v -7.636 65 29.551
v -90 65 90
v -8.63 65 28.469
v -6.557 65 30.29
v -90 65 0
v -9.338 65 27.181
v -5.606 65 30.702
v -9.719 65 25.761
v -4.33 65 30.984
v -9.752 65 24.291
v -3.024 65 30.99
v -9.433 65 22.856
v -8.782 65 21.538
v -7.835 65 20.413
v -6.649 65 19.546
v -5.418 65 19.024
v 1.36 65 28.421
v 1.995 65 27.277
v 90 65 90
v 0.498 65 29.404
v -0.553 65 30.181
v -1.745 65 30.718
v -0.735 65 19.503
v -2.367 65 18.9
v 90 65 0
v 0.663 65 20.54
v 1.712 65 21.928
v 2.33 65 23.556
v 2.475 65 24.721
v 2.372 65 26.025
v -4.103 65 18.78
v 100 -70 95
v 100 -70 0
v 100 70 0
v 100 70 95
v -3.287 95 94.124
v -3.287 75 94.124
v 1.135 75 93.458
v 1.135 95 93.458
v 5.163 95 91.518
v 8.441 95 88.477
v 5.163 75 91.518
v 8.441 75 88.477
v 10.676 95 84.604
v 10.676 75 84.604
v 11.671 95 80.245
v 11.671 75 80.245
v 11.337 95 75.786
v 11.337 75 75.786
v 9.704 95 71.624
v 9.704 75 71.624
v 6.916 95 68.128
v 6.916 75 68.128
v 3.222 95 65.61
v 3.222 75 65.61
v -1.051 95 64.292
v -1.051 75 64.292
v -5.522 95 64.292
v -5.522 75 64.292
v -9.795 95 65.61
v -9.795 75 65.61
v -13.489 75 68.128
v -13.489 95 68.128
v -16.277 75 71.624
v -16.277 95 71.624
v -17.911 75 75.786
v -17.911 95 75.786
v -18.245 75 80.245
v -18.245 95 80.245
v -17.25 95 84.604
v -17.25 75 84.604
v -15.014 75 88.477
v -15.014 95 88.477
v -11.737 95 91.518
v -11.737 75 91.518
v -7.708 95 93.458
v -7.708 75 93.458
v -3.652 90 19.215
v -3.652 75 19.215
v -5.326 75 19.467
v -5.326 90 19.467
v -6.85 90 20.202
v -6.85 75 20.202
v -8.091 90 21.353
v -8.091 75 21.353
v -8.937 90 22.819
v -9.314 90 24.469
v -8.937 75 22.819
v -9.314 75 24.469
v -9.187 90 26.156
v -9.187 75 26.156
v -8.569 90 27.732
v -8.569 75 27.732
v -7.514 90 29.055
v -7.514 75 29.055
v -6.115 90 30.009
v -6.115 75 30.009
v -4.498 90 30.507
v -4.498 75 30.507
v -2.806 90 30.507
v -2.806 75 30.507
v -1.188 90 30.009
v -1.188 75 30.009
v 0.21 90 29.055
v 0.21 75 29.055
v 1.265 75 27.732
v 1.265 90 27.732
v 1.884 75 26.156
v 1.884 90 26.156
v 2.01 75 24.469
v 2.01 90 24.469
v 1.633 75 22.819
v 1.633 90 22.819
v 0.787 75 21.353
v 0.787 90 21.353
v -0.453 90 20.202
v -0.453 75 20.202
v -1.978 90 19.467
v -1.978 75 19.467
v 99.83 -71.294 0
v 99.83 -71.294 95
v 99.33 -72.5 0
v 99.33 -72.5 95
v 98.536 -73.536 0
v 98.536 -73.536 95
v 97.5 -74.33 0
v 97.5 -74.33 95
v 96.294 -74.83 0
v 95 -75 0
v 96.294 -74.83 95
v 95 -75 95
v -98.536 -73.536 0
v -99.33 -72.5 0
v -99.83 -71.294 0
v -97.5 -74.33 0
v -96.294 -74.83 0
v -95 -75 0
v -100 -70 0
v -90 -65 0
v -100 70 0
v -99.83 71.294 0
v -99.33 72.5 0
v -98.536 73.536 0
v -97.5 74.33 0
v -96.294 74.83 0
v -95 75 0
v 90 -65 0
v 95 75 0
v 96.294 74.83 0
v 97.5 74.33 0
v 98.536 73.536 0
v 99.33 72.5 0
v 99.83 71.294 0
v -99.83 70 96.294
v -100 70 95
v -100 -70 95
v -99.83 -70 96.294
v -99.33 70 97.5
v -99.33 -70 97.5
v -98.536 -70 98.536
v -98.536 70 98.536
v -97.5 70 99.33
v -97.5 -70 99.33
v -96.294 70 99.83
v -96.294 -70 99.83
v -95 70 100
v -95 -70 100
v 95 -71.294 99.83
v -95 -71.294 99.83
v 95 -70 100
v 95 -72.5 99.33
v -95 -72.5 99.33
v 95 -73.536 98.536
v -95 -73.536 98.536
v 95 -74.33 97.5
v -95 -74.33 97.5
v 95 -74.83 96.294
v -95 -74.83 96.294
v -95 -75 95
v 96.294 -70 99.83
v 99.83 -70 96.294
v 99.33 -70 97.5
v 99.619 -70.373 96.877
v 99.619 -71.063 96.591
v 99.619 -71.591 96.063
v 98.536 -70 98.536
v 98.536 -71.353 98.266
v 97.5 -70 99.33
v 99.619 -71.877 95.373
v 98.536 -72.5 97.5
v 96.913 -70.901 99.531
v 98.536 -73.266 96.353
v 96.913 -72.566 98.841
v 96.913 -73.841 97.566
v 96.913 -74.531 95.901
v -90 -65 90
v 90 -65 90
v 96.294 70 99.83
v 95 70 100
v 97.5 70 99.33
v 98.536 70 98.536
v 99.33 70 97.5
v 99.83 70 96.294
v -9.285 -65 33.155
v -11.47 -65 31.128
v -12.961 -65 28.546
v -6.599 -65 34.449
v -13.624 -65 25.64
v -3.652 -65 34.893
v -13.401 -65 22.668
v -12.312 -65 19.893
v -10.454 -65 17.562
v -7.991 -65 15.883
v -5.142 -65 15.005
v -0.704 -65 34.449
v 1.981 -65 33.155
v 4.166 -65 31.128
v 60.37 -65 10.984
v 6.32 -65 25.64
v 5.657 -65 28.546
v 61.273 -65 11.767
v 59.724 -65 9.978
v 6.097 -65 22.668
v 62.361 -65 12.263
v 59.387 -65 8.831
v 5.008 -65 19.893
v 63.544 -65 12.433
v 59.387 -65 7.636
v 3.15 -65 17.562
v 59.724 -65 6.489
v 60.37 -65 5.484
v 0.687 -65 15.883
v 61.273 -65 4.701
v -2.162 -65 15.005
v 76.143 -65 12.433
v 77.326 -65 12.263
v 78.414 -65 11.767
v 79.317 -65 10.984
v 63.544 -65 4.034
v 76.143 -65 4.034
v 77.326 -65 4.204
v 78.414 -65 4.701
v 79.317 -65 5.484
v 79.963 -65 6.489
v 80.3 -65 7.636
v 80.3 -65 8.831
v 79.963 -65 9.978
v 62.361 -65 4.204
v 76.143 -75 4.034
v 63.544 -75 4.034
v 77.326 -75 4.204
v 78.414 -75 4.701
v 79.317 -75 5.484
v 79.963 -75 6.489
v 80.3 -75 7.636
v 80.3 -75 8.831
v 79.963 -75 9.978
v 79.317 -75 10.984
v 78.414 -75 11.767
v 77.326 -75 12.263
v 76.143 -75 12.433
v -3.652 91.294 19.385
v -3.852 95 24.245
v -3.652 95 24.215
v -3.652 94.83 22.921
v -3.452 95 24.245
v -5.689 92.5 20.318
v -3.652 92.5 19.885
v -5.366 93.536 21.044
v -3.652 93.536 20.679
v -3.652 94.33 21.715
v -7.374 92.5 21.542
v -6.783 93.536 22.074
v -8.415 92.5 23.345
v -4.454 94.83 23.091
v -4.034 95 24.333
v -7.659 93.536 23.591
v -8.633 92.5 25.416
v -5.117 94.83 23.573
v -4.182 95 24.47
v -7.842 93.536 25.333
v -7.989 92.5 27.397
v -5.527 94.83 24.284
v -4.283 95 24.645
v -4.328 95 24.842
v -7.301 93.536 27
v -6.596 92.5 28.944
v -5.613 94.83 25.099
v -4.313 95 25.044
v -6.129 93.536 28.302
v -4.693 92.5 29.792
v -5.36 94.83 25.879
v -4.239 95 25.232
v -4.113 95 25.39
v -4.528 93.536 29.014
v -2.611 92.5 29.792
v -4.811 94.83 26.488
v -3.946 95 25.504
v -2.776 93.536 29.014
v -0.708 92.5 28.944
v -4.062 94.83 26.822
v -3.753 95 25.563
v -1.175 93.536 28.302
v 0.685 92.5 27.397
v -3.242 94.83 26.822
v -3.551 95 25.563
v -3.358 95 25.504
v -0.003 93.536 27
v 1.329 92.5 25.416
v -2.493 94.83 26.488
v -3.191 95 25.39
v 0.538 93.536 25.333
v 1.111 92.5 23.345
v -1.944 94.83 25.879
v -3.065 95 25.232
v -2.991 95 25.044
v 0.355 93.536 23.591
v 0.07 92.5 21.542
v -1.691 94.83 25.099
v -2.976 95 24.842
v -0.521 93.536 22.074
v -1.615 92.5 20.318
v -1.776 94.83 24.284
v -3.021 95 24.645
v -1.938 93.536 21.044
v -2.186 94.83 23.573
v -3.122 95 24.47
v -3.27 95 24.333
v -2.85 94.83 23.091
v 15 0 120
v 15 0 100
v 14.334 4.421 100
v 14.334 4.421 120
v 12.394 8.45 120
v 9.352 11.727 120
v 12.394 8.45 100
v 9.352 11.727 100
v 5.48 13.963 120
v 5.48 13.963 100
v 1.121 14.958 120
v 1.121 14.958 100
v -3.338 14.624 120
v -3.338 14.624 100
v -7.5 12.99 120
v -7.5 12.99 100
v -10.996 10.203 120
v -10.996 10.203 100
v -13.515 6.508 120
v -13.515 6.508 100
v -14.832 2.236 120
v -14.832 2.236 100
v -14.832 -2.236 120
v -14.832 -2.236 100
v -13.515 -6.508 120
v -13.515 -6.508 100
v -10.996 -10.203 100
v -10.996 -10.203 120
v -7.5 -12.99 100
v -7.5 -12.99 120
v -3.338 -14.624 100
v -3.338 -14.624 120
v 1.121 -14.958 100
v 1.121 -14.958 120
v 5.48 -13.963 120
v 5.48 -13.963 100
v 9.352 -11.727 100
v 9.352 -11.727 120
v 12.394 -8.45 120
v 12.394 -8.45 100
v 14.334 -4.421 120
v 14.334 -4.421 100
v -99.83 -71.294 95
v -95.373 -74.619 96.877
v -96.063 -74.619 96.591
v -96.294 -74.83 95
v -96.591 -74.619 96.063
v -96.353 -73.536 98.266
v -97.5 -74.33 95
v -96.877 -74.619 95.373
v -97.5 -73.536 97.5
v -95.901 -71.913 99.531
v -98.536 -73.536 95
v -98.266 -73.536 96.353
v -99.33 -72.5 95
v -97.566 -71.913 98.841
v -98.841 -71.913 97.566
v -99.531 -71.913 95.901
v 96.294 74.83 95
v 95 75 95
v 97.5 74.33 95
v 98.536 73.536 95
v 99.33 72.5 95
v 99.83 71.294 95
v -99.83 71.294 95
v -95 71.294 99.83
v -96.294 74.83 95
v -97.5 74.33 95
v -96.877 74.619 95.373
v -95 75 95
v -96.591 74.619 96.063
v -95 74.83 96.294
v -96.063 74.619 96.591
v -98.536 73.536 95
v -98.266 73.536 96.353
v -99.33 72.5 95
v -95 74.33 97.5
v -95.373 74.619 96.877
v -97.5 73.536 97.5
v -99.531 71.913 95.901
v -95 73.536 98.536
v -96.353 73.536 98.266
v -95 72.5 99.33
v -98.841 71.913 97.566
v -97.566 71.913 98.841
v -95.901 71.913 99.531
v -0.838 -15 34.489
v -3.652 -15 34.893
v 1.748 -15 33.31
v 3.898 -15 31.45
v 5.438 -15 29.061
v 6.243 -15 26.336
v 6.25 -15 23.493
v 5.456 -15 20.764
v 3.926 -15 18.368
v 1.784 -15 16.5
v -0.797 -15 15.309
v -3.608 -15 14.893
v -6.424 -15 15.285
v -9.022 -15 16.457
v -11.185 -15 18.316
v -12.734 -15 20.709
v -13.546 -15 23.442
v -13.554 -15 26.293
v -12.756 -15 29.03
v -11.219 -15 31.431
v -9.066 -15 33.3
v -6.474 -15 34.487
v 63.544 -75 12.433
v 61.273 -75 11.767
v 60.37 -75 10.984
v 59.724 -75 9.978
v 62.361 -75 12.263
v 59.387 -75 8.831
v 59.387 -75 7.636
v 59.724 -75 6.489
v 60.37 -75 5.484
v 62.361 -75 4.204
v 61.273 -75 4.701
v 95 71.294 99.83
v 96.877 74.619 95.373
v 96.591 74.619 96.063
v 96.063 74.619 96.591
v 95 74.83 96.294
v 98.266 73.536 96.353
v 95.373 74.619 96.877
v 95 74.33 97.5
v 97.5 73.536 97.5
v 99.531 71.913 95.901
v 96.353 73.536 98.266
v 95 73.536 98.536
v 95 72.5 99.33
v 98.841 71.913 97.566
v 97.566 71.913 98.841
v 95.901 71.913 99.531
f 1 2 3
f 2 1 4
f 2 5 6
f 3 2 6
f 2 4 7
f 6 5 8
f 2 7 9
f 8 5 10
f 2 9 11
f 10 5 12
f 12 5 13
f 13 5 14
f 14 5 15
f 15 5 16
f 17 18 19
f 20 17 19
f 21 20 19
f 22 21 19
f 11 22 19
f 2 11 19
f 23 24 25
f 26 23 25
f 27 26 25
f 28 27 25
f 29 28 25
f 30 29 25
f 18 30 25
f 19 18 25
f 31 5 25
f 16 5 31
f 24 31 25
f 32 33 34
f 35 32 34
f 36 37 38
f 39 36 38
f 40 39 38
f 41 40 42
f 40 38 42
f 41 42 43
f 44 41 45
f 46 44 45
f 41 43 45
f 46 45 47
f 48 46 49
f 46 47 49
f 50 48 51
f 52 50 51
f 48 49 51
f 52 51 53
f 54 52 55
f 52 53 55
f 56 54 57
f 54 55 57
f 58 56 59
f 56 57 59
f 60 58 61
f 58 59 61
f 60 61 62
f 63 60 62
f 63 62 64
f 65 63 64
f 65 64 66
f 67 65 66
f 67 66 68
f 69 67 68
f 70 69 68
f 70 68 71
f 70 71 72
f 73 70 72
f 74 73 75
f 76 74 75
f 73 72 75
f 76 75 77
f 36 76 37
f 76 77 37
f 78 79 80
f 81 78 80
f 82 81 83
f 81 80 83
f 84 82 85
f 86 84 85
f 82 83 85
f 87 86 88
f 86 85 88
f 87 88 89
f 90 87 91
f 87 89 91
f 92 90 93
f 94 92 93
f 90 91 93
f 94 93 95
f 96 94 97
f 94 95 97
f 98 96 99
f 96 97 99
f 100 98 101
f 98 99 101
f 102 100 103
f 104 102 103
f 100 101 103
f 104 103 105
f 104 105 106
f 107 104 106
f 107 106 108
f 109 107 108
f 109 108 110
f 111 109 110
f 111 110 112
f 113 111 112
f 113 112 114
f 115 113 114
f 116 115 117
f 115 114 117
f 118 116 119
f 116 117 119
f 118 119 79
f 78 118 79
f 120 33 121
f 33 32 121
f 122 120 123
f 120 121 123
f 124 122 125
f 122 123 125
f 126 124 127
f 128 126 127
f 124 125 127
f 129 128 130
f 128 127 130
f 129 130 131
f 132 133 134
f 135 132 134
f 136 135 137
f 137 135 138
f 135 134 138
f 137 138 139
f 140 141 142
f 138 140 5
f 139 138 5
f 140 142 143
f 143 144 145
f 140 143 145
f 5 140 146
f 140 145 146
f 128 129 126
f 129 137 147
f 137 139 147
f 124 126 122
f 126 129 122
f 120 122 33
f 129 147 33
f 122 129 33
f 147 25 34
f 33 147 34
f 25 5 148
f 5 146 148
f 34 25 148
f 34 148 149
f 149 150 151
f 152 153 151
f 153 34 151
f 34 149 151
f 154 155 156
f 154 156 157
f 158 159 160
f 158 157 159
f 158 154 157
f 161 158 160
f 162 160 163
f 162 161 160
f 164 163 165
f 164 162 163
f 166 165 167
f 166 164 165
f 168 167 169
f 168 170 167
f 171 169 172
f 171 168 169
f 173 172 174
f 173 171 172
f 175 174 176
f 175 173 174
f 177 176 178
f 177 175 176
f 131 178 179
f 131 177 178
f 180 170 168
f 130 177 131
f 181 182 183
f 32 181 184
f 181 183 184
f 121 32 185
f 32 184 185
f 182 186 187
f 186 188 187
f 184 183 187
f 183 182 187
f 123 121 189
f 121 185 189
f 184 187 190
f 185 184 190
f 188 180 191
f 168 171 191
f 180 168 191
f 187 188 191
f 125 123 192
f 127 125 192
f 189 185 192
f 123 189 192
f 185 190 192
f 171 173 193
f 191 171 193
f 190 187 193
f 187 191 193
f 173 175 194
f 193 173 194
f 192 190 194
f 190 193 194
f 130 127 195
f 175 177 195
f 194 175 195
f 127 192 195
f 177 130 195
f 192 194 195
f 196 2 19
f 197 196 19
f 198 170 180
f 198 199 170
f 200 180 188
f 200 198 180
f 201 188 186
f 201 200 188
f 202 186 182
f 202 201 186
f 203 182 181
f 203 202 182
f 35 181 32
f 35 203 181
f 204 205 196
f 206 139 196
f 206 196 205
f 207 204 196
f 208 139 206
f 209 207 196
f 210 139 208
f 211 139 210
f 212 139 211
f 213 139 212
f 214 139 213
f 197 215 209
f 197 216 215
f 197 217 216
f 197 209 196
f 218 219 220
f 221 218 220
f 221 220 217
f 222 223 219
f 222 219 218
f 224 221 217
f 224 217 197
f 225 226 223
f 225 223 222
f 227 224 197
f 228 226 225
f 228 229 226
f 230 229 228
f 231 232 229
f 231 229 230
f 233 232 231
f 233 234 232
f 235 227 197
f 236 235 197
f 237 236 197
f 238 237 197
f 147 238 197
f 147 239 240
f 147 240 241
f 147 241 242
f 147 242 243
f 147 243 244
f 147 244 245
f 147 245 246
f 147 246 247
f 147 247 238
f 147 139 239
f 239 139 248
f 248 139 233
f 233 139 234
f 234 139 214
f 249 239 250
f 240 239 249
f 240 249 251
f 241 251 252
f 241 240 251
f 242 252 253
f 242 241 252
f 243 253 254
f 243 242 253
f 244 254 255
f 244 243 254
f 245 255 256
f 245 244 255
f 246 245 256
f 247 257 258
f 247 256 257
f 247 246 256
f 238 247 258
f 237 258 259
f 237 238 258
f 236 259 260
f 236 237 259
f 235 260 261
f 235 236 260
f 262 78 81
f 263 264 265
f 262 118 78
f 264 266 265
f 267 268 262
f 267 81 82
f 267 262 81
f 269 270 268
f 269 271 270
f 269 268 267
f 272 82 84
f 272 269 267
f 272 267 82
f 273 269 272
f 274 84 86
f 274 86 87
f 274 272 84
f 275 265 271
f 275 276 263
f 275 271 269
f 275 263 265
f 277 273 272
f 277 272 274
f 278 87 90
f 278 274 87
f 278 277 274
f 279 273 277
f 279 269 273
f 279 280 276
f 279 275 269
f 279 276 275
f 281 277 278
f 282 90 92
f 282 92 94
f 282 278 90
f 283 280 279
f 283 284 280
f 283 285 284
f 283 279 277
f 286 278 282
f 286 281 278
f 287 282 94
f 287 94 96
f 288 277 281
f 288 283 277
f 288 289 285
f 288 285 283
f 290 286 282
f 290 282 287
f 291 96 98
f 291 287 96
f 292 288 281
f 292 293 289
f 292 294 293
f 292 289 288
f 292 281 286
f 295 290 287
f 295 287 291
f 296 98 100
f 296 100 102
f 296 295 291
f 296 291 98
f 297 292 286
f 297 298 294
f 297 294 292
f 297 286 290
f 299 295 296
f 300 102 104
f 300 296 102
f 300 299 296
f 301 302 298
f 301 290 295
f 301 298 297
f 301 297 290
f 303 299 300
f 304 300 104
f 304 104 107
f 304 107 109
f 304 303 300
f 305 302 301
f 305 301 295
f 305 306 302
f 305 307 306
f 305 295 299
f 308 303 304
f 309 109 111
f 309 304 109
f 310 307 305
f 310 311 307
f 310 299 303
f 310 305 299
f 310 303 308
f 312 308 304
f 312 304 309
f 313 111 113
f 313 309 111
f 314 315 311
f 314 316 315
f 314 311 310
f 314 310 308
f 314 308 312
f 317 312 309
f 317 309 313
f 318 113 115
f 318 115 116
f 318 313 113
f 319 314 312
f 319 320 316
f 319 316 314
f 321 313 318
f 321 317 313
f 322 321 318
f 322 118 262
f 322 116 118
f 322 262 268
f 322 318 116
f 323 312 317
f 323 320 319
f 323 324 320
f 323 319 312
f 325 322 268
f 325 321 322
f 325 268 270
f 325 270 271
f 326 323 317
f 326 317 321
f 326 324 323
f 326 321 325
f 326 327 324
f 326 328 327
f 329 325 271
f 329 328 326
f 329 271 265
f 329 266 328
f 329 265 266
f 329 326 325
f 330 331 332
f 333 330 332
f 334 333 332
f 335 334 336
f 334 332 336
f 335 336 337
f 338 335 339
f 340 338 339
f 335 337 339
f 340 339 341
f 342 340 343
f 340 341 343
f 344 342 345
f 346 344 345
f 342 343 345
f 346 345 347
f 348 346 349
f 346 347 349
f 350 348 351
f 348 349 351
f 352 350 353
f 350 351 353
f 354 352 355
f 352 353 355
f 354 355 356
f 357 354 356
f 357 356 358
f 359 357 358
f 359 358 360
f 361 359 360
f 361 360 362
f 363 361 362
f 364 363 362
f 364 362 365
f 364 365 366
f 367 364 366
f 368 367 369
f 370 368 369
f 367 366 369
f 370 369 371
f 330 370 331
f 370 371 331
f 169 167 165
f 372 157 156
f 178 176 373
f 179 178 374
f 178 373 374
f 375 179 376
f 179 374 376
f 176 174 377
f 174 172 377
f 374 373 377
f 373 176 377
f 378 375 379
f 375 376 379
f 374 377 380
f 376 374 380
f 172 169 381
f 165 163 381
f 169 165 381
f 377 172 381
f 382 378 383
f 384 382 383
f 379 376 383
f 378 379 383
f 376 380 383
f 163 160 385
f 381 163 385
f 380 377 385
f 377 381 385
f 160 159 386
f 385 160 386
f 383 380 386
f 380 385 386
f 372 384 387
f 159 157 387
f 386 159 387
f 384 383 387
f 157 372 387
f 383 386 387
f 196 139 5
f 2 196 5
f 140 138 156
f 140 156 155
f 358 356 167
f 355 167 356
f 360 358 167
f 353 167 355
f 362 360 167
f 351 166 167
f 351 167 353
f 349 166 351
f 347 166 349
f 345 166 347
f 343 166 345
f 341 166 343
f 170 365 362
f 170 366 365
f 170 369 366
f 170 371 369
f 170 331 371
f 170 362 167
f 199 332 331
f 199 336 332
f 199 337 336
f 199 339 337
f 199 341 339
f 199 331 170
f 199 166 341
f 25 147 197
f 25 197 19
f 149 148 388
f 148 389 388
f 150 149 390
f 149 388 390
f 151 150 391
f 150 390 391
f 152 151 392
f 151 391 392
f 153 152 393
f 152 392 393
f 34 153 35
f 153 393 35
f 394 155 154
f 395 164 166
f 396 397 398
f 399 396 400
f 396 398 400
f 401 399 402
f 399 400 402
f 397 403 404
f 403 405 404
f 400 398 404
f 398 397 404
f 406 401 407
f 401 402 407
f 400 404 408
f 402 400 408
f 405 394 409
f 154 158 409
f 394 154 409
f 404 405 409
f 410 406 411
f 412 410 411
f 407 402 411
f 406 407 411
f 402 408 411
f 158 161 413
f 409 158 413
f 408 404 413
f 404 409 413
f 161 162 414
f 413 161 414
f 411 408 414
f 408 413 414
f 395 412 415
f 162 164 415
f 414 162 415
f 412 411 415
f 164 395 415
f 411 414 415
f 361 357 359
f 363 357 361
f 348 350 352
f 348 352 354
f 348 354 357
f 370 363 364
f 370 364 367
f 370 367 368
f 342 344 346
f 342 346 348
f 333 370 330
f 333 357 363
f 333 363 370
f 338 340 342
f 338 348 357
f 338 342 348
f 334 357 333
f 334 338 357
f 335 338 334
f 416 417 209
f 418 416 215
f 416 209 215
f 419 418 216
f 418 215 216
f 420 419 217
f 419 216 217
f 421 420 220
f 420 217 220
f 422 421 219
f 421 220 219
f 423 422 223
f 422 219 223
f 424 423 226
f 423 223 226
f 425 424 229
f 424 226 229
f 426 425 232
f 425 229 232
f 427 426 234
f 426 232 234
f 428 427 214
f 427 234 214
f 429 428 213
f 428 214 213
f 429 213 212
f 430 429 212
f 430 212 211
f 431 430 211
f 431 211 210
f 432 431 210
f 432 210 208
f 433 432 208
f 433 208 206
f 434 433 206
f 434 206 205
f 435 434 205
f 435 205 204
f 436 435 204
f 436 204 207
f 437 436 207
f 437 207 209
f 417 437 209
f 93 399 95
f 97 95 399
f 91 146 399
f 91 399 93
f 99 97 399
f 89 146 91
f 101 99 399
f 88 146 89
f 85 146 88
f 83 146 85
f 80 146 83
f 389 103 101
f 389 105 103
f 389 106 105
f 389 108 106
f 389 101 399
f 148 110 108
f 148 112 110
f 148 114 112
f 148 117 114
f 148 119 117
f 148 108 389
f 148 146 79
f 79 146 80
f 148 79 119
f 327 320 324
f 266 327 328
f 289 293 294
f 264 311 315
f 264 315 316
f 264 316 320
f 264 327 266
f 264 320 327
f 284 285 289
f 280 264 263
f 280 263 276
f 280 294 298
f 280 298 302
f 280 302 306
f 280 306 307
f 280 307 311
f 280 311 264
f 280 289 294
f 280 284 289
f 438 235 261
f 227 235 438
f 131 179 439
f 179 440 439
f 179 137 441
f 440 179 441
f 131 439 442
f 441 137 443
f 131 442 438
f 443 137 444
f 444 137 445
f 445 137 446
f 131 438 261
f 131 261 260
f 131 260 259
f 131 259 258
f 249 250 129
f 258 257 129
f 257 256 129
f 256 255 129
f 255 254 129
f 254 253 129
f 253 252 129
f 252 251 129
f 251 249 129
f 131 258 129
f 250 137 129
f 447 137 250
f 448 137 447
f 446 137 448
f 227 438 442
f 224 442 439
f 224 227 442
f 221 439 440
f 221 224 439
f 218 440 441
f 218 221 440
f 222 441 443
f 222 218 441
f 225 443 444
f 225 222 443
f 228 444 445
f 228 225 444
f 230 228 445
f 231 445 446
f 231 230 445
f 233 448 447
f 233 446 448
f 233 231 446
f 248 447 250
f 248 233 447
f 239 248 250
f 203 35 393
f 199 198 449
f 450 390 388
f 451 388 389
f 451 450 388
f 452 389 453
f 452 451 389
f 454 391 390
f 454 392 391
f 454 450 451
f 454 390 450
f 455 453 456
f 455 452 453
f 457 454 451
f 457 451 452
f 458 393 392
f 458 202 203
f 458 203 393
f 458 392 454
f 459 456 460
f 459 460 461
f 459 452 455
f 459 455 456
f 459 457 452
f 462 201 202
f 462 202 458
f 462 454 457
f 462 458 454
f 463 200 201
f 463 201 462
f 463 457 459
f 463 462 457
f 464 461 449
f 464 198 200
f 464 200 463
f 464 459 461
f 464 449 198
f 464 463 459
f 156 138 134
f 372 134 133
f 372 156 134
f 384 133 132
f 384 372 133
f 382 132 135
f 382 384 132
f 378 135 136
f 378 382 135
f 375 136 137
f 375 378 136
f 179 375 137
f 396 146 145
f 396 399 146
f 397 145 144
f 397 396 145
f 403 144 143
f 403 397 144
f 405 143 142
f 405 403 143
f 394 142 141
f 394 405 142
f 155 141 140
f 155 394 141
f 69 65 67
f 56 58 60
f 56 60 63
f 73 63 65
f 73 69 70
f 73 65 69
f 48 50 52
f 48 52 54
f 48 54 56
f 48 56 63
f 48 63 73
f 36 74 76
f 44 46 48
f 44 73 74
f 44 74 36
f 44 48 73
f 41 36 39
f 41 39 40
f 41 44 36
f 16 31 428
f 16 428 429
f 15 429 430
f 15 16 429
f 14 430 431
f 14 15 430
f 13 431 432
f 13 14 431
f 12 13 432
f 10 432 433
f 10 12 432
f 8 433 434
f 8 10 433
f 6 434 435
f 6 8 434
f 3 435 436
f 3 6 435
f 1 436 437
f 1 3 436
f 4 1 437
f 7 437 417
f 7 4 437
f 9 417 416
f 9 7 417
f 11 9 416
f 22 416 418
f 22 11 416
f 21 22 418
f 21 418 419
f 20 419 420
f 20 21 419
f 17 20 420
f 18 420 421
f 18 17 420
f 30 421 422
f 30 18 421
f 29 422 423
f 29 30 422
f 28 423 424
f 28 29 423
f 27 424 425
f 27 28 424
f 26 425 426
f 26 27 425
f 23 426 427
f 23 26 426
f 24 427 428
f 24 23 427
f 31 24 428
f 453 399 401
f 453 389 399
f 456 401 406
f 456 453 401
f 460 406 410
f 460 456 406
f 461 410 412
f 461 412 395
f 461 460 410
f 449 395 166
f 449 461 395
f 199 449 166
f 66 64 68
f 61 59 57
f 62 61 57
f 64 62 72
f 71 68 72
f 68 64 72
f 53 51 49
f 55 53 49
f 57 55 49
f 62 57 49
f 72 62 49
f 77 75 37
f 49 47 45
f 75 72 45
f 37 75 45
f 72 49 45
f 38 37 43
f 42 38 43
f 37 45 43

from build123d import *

# Parameters (mm, degrees)
SKETCH_1_W          = 200
SKETCH_1_H          = 150
EXTRUDE_1_DEPTH     = 100
SKETCH_3_R          = 15
EXTRUDE_2_DEPTH     = 20
SHELL_7_T           = -10
SKETCH_5_R          = 15
EXTRUDE_5_DEPTH     = 20
SKETCH_4_R          = 10
EXTRUDE_6_DEPTH     = 50
SKETCH_7_3_R        = 5.677909162
EXTRUDE_7_DEPTH     = 20
FILLET_2_R          = 5
FILLET_3_R          = 5
CUT_EXTRUDE_4_DEPTH = 20


with BuildPart() as part:
    # 草图1 → 凸台-拉伸1 (new body)
    with BuildSketch(Plane.XY):
        Rectangle(SKETCH_1_W, SKETCH_1_H)
    extrude(amount=EXTRUDE_1_DEPTH)

    # 抽壳7
    shell_7_openings = [part.faces().sort_by_distance(p)[0] for p in [
        (0, 0, 0),
    ]]
    offset(amount=SHELL_7_T, openings=shell_7_openings, kind=Kind.INTERSECTION)

    # 草图5 → 凸台-拉伸5 (add)
    with BuildSketch(Plane.XY.offset(100)):
        Circle(SKETCH_5_R)
    extrude(amount=EXTRUDE_5_DEPTH)

    # 草图4 → 凸台-拉伸6 (add)
    with BuildSketch(Plane(origin=(0, -65, 0), x_dir=(1, 0, 0), z_dir=(0, 1, 0))):
        with Locations(Location((-3.651940705, -24.892907654, 0), (0, 0, 270))):
            Circle(SKETCH_4_R)
    extrude(amount=EXTRUDE_6_DEPTH)

    # 放样2: read off the stored shape, not the designer's step
    # 放样2: loft between two sections, ruled curve by curve
    loft_2_from = [
        Edge.make_bspline([(-6.42374571, -15, 15.284729002), (-25.640103015, -15, 20.828339012), (-20.096493004, -15, 40.044696317), (-0.8801357, -15, 34.501086306), (18.336221605, -15, 28.957476296), (12.792611594, -15, 9.741118991), (-6.42374571, -15, 15.284729002)], [0, 0, 0, 0, 0.5, 0.5, 0.5, 1, 1, 1, 1], 3, [1, 0.333333333, 0.333333333, 1, 0.333333333, 0.333333333, 1]),
    ]
    loft_2_to = [
        Edge.make_bspline([(-3.812458415, 75, 19.217267909), (-15.163737905, 75, 19.538303329), (-14.842702485, 75, 30.889582819), (-3.491422995, 75, 30.568547399), (7.859856496, 75, 30.247511979), (7.538821075, 75, 18.896232489), (-3.812458415, 75, 19.217267909)], [0, 0, 0, 0, 0.5, 0.5, 0.5, 1, 1, 1, 1], 3, [1, 0.333333333, 0.333333333, 1, 0.333333333, 0.333333333, 1]),
    ]
    loft_2 = Solid(Shell([*[Face.make_surface_from_curves(loft_2_from[k], loft_2_to[k]) for k in range(1)], Face(Wire(loft_2_from)), Face(Wire(loft_2_to))]))
    add(loft_2)

    # 草图7<3> → 凸台-拉伸7 (add)
    with BuildSketch(Plane(origin=(0, 75, 0), x_dir=(1, 0, 0), z_dir=(0, 1, 0))):
        with Locations(Location((-3.651940705, -24.892907654, 0), (0, 0, 90))):
            Circle(SKETCH_7_3_R)
    extrude(amount=EXTRUDE_7_DEPTH)

    # 圆角2
    fillet_2_edges = [part.edges().sort_by_distance(p)[0] for p in [
        (-3.651940705, 95, 30.570816816),
    ]]
    fillet(fillet_2_edges, radius=FILLET_2_R)

    # 圆角3
    fillet_3_edges = [part.edges().sort_by_distance(p)[0] for p in [
        (-100, 0, 100),
        (0, -75, 100),
        (100, 0, 100),
        (100, -75, 50),
        (-100, -75, 50),
        (-100, 75, 50),
        (100, 75, 50),
        (0, 75, 100),
    ]]
    fillet(fillet_3_edges, radius=FILLET_3_R)

    # 草图8 → 切除-拉伸4 (cut)
    with BuildSketch(Plane(origin=(0, -65, 0), x_dir=(1, 0, 0), z_dir=(0, 1, 0))):
        with BuildLine():
            Line((63.543768265, -4.034008698), (76.142963697, -4.034008698))
            ThreePointArc((76.142963697, -4.034008698), (80.342695507, -8.233740508), (76.142963697, -12.433472319))
            Line((76.142963697, -12.433472319), (63.543768265, -12.433472319))
            ThreePointArc((63.543768265, -12.433472319), (59.344036454, -8.233740508), (63.543768265, -4.034008698))
        make_face()
    extrude(amount=-CUT_EXTRUDE_4_DEPTH, mode=Mode.SUBTRACT)


with BuildPart() as body_2:
    # 草图3 → 凸台-拉伸2 (new body)
    with BuildSketch(Plane(origin=(0, 75, 0), x_dir=(1, 0, 0), z_dir=(0, 1, 0))):
        with Locations(Location((-3.286746634, -79.124227121, 0), (0, 0, 270))):
            Circle(SKETCH_3_R)
    extrude(amount=EXTRUDE_2_DEPTH)


solid = Compound([part.part, body_2.part])
